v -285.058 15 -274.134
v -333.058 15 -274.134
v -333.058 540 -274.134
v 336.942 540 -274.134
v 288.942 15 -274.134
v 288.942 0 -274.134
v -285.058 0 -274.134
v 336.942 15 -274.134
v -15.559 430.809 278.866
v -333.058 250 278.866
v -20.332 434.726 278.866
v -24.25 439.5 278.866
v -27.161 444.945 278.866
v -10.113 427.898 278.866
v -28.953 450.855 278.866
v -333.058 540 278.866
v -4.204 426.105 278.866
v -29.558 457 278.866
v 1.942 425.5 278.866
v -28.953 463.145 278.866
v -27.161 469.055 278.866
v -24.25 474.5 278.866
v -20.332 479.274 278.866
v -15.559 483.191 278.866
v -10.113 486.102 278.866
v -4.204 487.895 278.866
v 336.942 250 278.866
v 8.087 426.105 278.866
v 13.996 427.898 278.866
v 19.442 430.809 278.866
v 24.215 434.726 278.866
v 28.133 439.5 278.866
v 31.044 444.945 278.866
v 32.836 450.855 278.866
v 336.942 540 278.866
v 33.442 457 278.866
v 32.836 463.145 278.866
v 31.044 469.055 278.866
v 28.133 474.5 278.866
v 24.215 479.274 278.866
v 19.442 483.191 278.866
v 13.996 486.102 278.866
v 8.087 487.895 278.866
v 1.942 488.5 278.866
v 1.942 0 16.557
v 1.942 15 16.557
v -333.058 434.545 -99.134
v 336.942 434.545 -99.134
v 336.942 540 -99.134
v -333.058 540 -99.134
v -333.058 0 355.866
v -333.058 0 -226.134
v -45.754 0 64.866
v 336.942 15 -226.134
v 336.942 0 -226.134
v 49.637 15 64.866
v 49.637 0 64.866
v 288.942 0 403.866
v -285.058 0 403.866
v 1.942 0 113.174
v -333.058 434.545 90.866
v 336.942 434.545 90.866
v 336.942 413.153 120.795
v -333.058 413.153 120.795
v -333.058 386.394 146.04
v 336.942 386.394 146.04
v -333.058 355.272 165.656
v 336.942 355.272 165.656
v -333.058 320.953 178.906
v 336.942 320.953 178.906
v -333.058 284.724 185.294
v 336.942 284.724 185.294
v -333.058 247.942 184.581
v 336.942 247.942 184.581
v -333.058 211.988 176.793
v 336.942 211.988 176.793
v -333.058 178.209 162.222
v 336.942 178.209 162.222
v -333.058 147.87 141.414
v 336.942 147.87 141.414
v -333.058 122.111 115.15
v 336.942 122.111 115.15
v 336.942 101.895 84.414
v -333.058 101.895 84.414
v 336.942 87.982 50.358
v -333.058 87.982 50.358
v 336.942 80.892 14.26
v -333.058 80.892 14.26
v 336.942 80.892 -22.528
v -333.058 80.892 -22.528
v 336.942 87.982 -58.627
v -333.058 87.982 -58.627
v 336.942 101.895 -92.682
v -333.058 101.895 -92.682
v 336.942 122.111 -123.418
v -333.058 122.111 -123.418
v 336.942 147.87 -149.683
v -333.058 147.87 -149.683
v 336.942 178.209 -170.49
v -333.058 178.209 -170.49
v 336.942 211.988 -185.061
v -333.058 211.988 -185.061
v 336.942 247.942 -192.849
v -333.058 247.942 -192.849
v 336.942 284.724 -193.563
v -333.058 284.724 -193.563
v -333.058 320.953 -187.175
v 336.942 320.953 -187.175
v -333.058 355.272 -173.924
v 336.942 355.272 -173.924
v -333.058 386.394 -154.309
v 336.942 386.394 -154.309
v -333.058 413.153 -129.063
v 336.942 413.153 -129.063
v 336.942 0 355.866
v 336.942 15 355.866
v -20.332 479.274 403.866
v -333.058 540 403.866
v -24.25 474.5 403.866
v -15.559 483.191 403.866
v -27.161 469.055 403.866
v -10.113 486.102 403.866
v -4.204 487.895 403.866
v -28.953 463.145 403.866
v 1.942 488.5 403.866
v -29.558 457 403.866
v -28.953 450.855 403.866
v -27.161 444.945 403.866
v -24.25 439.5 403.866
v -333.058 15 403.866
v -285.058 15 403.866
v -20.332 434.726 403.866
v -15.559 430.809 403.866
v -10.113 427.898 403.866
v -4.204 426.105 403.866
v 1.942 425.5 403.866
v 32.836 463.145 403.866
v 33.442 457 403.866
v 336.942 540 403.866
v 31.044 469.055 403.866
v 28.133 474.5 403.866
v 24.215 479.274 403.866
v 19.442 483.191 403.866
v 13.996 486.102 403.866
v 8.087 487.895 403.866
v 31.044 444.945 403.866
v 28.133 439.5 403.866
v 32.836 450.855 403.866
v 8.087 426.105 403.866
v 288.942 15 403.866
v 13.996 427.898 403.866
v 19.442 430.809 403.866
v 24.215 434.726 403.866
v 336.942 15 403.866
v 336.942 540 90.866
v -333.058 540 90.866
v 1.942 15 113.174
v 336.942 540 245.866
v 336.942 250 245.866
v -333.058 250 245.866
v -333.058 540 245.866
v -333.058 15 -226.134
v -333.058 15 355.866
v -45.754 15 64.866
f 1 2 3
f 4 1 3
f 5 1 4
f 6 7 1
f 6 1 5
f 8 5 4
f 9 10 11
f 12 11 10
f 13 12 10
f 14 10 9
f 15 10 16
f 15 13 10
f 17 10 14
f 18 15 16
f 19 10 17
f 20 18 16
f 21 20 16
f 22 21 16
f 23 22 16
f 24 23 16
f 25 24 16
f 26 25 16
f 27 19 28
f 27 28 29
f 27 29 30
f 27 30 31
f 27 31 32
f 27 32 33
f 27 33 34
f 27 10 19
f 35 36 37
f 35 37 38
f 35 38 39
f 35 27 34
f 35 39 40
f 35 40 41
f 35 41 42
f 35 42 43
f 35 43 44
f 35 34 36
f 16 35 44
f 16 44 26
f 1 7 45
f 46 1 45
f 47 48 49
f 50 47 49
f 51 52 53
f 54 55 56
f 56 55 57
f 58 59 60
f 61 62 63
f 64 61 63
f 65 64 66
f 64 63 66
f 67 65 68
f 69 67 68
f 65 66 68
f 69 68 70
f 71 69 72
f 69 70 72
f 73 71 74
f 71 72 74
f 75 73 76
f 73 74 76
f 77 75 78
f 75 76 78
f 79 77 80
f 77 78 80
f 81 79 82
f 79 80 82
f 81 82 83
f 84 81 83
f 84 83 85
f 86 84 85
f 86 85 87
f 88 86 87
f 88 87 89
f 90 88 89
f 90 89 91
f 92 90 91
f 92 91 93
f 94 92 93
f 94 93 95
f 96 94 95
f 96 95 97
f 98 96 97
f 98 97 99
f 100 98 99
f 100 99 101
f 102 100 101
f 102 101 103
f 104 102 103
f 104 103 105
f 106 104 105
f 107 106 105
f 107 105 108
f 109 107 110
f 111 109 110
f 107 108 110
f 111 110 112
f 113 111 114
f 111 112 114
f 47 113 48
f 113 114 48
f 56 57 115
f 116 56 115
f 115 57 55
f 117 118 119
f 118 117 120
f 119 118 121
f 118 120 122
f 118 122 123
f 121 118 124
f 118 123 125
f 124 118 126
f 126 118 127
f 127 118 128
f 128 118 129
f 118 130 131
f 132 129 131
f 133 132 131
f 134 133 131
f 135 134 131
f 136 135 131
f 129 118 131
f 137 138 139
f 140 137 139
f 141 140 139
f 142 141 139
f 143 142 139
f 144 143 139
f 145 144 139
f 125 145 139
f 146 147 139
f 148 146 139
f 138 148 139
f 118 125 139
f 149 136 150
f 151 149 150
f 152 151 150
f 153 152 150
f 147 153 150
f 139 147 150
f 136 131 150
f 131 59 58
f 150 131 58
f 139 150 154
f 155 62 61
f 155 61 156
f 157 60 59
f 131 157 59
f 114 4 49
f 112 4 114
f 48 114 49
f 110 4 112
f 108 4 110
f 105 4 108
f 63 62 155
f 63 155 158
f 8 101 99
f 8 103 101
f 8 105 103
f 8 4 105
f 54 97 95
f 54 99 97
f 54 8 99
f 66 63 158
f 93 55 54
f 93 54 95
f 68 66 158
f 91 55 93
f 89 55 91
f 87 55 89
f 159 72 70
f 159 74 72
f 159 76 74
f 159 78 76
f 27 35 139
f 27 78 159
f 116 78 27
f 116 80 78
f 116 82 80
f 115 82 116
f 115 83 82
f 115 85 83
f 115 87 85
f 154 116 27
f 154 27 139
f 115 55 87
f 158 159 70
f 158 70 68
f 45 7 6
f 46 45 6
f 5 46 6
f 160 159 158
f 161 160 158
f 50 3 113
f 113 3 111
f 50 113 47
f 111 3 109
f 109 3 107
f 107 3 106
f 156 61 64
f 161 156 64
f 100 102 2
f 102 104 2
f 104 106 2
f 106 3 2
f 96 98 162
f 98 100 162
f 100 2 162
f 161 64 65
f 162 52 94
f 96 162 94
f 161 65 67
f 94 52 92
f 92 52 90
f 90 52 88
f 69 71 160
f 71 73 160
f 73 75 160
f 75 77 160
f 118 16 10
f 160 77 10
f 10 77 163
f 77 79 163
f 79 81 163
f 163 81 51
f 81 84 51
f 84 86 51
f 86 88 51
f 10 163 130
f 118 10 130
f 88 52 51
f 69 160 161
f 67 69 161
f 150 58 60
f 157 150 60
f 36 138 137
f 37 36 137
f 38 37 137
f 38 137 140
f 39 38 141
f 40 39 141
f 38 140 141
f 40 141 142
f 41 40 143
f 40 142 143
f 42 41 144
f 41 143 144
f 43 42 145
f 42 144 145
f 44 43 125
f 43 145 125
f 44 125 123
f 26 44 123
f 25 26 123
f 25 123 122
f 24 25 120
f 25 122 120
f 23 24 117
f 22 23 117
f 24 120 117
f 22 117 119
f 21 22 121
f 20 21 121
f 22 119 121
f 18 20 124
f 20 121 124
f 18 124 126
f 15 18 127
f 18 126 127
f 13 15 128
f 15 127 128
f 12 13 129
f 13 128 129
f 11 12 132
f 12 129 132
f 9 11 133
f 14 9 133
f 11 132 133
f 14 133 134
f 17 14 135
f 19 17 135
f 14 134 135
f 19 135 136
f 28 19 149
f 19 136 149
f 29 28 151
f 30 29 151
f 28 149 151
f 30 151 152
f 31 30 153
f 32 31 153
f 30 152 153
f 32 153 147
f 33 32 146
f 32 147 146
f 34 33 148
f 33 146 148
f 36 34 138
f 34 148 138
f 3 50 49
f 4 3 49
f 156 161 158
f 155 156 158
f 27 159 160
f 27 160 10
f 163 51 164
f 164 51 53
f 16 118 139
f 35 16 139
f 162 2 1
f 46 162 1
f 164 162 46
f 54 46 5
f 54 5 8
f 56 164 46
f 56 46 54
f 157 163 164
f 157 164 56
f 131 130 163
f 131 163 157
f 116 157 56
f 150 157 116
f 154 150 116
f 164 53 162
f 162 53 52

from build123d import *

# Parameters (mm, degrees)
F0_W      = 670
F0_H      = 678
F1_DEPTH  = 540
F2_R      = 31.5
F3_DEPTH  = 125
F4_W      = 290
F4_H      = 33
F5_DEPTH  = 670
F6_R      = 190
F7_DEPTH  = 670
F8_W      = 105.455173281
F8_H      = 190
F9_DEPTH  = 670
F11_DEPTH = 15


with BuildPart() as f1:
    # F0 (on Front) → F1 (new body)
    with BuildSketch(Plane.XZ):
        with Locations((1.9415970892, 64.8658148712)):
            Rectangle(F0_W, F0_H)
    extrude(amount=-F1_DEPTH)

    # F2 (on face) → F3 (cut)
    with BuildSketch(Plane.XY.offset(403.8658148712)):
        with Locations((1.9415970892, 457)):
            Circle(F2_R)
    extrude(amount=-F3_DEPTH, mode=Mode.SUBTRACT)

    # F4 (on face) → F5 (cut)
    with BuildSketch(Plane.YZ.offset(336.9415970892)):
        with Locations((395, 262.3658148712)):
            Rectangle(F4_W, F4_H)
    extrude(amount=-F5_DEPTH, mode=Mode.SUBTRACT)

    # F6 (on face) → F7 (cut)
    with BuildSketch(Plane.YZ.offset(336.9415970892)):
        with Locations((270, -4.1341851288)):
            Circle(F6_R)
    extrude(amount=-F7_DEPTH, mode=Mode.SUBTRACT)

    # F8 (on face) → F9 (cut)
    with BuildSketch(Plane.YZ.offset(336.9415970892)):
        with Locations((487.2724133595, -4.1341851288)):
            Rectangle(F8_W, F8_H)
    extrude(amount=-F9_DEPTH, mode=Mode.SUBTRACT)

    # F10 (on face) → F11 (cut)
    with BuildSketch(Plane.XZ):
        Polygon((-285.0584029108, 403.8658148712), (-333.0584029108, 403.8658148712), (-333.0584029108, 355.8658148712), (-45.7536410061, 64.8658148712), (-333.0584029108, -226.1341851288), (-333.0584029108, -274.1341851288), (-285.0584029108, -274.1341851288), (1.9415970892, 16.5571331991), (288.9415970892, -274.1341851288), (336.9415970892, -274.1341851288), (336.9415970892, -226.1341851288), (49.6368351844, 64.8658148712), (336.9415970892, 355.8658148712), (336.9415970892, 403.8658148712), (288.9415970892, 403.8658148712), (1.9415970892, 113.1744965432), align=None)
    extrude(amount=-F11_DEPTH, mode=Mode.SUBTRACT)


solid = f1.part
